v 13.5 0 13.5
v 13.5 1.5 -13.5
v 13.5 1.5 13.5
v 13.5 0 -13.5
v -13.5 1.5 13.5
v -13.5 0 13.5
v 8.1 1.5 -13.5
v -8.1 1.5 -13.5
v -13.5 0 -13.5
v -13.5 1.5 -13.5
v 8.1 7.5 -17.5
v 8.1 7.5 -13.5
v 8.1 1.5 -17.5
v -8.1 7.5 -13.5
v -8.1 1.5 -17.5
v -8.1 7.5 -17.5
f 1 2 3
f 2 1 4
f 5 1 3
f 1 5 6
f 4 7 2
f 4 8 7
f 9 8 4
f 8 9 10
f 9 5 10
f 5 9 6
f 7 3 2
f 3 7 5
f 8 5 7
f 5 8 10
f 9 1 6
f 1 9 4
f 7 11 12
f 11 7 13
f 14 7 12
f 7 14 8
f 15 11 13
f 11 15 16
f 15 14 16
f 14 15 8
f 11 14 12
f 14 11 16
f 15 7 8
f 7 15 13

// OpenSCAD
//
// ============================================================================
// SteamMachine UM790
// Project Phoenix
//
// Archivo  : oled.scad
// Versión  : 1.0
// Fecha    : 2026-08-03
//
// Volumen mecánico de referencia del módulo OLED 27 x 27 mm para el
// ensamblaje virtual v1.
//
// NO ES UNA PIEZA IMPRIMIBLE.
//
// Sistema de coordenadas LOCAL de este módulo:
//   Origen (0,0,0) = centro del módulo en X/Z, cara frontal (visible
//                     a través del panel).
//   +Y = hacia el interior del chasis (pines de conexión).
//   +Z = hacia arriba.
//
// ============================================================================

include <../../../00_parametros.scad>;

$fn = 24;

part_version = "1.0";


//=============================================================================
// COLORES
//=============================================================================

oledGlassColor = [0.05,0.05,0.10,1.0];
oledPinColor   = [0.80,0.80,0.20,1.0];


//=============================================================================
// MÓDULO (VIDRIO + PCB)
//=============================================================================

module oledPanel()
{

    color(oledGlassColor)

    translate([
        -oled_module_width/2,
        0,
        -oled_module_height/2
    ])

        cube([
            oled_module_width,
            oled_module_thickness,
            oled_module_height
        ]);

}


//=============================================================================
// PINES / SOLDADURA TRASERA
//=============================================================================

module oledPins()
{

    pinBlockWidth  = oled_module_width*0.6;
    pinBlockHeight = 4;

    color(oledPinColor)

    translate([
        -pinBlockWidth/2,
        oled_module_thickness,
        -oled_module_height/2 - pinBlockHeight
    ])

        cube([
            pinBlockWidth,
            oled_module_pin_height,
            pinBlockHeight
        ]);

}


//=============================================================================
// CUERPO MECÁNICO (para comprobación de colisiones "duras")
//=============================================================================

module oledBody()
{

    union()
    {
        oledPanel();
        oledPins();
    }

}


//=============================================================================
// CONJUNTO COMPLETO (visualización)
//=============================================================================

module oled()
{

    oledBody();

}


//=============================================================================
// PREVIEW
//=============================================================================

oled();
